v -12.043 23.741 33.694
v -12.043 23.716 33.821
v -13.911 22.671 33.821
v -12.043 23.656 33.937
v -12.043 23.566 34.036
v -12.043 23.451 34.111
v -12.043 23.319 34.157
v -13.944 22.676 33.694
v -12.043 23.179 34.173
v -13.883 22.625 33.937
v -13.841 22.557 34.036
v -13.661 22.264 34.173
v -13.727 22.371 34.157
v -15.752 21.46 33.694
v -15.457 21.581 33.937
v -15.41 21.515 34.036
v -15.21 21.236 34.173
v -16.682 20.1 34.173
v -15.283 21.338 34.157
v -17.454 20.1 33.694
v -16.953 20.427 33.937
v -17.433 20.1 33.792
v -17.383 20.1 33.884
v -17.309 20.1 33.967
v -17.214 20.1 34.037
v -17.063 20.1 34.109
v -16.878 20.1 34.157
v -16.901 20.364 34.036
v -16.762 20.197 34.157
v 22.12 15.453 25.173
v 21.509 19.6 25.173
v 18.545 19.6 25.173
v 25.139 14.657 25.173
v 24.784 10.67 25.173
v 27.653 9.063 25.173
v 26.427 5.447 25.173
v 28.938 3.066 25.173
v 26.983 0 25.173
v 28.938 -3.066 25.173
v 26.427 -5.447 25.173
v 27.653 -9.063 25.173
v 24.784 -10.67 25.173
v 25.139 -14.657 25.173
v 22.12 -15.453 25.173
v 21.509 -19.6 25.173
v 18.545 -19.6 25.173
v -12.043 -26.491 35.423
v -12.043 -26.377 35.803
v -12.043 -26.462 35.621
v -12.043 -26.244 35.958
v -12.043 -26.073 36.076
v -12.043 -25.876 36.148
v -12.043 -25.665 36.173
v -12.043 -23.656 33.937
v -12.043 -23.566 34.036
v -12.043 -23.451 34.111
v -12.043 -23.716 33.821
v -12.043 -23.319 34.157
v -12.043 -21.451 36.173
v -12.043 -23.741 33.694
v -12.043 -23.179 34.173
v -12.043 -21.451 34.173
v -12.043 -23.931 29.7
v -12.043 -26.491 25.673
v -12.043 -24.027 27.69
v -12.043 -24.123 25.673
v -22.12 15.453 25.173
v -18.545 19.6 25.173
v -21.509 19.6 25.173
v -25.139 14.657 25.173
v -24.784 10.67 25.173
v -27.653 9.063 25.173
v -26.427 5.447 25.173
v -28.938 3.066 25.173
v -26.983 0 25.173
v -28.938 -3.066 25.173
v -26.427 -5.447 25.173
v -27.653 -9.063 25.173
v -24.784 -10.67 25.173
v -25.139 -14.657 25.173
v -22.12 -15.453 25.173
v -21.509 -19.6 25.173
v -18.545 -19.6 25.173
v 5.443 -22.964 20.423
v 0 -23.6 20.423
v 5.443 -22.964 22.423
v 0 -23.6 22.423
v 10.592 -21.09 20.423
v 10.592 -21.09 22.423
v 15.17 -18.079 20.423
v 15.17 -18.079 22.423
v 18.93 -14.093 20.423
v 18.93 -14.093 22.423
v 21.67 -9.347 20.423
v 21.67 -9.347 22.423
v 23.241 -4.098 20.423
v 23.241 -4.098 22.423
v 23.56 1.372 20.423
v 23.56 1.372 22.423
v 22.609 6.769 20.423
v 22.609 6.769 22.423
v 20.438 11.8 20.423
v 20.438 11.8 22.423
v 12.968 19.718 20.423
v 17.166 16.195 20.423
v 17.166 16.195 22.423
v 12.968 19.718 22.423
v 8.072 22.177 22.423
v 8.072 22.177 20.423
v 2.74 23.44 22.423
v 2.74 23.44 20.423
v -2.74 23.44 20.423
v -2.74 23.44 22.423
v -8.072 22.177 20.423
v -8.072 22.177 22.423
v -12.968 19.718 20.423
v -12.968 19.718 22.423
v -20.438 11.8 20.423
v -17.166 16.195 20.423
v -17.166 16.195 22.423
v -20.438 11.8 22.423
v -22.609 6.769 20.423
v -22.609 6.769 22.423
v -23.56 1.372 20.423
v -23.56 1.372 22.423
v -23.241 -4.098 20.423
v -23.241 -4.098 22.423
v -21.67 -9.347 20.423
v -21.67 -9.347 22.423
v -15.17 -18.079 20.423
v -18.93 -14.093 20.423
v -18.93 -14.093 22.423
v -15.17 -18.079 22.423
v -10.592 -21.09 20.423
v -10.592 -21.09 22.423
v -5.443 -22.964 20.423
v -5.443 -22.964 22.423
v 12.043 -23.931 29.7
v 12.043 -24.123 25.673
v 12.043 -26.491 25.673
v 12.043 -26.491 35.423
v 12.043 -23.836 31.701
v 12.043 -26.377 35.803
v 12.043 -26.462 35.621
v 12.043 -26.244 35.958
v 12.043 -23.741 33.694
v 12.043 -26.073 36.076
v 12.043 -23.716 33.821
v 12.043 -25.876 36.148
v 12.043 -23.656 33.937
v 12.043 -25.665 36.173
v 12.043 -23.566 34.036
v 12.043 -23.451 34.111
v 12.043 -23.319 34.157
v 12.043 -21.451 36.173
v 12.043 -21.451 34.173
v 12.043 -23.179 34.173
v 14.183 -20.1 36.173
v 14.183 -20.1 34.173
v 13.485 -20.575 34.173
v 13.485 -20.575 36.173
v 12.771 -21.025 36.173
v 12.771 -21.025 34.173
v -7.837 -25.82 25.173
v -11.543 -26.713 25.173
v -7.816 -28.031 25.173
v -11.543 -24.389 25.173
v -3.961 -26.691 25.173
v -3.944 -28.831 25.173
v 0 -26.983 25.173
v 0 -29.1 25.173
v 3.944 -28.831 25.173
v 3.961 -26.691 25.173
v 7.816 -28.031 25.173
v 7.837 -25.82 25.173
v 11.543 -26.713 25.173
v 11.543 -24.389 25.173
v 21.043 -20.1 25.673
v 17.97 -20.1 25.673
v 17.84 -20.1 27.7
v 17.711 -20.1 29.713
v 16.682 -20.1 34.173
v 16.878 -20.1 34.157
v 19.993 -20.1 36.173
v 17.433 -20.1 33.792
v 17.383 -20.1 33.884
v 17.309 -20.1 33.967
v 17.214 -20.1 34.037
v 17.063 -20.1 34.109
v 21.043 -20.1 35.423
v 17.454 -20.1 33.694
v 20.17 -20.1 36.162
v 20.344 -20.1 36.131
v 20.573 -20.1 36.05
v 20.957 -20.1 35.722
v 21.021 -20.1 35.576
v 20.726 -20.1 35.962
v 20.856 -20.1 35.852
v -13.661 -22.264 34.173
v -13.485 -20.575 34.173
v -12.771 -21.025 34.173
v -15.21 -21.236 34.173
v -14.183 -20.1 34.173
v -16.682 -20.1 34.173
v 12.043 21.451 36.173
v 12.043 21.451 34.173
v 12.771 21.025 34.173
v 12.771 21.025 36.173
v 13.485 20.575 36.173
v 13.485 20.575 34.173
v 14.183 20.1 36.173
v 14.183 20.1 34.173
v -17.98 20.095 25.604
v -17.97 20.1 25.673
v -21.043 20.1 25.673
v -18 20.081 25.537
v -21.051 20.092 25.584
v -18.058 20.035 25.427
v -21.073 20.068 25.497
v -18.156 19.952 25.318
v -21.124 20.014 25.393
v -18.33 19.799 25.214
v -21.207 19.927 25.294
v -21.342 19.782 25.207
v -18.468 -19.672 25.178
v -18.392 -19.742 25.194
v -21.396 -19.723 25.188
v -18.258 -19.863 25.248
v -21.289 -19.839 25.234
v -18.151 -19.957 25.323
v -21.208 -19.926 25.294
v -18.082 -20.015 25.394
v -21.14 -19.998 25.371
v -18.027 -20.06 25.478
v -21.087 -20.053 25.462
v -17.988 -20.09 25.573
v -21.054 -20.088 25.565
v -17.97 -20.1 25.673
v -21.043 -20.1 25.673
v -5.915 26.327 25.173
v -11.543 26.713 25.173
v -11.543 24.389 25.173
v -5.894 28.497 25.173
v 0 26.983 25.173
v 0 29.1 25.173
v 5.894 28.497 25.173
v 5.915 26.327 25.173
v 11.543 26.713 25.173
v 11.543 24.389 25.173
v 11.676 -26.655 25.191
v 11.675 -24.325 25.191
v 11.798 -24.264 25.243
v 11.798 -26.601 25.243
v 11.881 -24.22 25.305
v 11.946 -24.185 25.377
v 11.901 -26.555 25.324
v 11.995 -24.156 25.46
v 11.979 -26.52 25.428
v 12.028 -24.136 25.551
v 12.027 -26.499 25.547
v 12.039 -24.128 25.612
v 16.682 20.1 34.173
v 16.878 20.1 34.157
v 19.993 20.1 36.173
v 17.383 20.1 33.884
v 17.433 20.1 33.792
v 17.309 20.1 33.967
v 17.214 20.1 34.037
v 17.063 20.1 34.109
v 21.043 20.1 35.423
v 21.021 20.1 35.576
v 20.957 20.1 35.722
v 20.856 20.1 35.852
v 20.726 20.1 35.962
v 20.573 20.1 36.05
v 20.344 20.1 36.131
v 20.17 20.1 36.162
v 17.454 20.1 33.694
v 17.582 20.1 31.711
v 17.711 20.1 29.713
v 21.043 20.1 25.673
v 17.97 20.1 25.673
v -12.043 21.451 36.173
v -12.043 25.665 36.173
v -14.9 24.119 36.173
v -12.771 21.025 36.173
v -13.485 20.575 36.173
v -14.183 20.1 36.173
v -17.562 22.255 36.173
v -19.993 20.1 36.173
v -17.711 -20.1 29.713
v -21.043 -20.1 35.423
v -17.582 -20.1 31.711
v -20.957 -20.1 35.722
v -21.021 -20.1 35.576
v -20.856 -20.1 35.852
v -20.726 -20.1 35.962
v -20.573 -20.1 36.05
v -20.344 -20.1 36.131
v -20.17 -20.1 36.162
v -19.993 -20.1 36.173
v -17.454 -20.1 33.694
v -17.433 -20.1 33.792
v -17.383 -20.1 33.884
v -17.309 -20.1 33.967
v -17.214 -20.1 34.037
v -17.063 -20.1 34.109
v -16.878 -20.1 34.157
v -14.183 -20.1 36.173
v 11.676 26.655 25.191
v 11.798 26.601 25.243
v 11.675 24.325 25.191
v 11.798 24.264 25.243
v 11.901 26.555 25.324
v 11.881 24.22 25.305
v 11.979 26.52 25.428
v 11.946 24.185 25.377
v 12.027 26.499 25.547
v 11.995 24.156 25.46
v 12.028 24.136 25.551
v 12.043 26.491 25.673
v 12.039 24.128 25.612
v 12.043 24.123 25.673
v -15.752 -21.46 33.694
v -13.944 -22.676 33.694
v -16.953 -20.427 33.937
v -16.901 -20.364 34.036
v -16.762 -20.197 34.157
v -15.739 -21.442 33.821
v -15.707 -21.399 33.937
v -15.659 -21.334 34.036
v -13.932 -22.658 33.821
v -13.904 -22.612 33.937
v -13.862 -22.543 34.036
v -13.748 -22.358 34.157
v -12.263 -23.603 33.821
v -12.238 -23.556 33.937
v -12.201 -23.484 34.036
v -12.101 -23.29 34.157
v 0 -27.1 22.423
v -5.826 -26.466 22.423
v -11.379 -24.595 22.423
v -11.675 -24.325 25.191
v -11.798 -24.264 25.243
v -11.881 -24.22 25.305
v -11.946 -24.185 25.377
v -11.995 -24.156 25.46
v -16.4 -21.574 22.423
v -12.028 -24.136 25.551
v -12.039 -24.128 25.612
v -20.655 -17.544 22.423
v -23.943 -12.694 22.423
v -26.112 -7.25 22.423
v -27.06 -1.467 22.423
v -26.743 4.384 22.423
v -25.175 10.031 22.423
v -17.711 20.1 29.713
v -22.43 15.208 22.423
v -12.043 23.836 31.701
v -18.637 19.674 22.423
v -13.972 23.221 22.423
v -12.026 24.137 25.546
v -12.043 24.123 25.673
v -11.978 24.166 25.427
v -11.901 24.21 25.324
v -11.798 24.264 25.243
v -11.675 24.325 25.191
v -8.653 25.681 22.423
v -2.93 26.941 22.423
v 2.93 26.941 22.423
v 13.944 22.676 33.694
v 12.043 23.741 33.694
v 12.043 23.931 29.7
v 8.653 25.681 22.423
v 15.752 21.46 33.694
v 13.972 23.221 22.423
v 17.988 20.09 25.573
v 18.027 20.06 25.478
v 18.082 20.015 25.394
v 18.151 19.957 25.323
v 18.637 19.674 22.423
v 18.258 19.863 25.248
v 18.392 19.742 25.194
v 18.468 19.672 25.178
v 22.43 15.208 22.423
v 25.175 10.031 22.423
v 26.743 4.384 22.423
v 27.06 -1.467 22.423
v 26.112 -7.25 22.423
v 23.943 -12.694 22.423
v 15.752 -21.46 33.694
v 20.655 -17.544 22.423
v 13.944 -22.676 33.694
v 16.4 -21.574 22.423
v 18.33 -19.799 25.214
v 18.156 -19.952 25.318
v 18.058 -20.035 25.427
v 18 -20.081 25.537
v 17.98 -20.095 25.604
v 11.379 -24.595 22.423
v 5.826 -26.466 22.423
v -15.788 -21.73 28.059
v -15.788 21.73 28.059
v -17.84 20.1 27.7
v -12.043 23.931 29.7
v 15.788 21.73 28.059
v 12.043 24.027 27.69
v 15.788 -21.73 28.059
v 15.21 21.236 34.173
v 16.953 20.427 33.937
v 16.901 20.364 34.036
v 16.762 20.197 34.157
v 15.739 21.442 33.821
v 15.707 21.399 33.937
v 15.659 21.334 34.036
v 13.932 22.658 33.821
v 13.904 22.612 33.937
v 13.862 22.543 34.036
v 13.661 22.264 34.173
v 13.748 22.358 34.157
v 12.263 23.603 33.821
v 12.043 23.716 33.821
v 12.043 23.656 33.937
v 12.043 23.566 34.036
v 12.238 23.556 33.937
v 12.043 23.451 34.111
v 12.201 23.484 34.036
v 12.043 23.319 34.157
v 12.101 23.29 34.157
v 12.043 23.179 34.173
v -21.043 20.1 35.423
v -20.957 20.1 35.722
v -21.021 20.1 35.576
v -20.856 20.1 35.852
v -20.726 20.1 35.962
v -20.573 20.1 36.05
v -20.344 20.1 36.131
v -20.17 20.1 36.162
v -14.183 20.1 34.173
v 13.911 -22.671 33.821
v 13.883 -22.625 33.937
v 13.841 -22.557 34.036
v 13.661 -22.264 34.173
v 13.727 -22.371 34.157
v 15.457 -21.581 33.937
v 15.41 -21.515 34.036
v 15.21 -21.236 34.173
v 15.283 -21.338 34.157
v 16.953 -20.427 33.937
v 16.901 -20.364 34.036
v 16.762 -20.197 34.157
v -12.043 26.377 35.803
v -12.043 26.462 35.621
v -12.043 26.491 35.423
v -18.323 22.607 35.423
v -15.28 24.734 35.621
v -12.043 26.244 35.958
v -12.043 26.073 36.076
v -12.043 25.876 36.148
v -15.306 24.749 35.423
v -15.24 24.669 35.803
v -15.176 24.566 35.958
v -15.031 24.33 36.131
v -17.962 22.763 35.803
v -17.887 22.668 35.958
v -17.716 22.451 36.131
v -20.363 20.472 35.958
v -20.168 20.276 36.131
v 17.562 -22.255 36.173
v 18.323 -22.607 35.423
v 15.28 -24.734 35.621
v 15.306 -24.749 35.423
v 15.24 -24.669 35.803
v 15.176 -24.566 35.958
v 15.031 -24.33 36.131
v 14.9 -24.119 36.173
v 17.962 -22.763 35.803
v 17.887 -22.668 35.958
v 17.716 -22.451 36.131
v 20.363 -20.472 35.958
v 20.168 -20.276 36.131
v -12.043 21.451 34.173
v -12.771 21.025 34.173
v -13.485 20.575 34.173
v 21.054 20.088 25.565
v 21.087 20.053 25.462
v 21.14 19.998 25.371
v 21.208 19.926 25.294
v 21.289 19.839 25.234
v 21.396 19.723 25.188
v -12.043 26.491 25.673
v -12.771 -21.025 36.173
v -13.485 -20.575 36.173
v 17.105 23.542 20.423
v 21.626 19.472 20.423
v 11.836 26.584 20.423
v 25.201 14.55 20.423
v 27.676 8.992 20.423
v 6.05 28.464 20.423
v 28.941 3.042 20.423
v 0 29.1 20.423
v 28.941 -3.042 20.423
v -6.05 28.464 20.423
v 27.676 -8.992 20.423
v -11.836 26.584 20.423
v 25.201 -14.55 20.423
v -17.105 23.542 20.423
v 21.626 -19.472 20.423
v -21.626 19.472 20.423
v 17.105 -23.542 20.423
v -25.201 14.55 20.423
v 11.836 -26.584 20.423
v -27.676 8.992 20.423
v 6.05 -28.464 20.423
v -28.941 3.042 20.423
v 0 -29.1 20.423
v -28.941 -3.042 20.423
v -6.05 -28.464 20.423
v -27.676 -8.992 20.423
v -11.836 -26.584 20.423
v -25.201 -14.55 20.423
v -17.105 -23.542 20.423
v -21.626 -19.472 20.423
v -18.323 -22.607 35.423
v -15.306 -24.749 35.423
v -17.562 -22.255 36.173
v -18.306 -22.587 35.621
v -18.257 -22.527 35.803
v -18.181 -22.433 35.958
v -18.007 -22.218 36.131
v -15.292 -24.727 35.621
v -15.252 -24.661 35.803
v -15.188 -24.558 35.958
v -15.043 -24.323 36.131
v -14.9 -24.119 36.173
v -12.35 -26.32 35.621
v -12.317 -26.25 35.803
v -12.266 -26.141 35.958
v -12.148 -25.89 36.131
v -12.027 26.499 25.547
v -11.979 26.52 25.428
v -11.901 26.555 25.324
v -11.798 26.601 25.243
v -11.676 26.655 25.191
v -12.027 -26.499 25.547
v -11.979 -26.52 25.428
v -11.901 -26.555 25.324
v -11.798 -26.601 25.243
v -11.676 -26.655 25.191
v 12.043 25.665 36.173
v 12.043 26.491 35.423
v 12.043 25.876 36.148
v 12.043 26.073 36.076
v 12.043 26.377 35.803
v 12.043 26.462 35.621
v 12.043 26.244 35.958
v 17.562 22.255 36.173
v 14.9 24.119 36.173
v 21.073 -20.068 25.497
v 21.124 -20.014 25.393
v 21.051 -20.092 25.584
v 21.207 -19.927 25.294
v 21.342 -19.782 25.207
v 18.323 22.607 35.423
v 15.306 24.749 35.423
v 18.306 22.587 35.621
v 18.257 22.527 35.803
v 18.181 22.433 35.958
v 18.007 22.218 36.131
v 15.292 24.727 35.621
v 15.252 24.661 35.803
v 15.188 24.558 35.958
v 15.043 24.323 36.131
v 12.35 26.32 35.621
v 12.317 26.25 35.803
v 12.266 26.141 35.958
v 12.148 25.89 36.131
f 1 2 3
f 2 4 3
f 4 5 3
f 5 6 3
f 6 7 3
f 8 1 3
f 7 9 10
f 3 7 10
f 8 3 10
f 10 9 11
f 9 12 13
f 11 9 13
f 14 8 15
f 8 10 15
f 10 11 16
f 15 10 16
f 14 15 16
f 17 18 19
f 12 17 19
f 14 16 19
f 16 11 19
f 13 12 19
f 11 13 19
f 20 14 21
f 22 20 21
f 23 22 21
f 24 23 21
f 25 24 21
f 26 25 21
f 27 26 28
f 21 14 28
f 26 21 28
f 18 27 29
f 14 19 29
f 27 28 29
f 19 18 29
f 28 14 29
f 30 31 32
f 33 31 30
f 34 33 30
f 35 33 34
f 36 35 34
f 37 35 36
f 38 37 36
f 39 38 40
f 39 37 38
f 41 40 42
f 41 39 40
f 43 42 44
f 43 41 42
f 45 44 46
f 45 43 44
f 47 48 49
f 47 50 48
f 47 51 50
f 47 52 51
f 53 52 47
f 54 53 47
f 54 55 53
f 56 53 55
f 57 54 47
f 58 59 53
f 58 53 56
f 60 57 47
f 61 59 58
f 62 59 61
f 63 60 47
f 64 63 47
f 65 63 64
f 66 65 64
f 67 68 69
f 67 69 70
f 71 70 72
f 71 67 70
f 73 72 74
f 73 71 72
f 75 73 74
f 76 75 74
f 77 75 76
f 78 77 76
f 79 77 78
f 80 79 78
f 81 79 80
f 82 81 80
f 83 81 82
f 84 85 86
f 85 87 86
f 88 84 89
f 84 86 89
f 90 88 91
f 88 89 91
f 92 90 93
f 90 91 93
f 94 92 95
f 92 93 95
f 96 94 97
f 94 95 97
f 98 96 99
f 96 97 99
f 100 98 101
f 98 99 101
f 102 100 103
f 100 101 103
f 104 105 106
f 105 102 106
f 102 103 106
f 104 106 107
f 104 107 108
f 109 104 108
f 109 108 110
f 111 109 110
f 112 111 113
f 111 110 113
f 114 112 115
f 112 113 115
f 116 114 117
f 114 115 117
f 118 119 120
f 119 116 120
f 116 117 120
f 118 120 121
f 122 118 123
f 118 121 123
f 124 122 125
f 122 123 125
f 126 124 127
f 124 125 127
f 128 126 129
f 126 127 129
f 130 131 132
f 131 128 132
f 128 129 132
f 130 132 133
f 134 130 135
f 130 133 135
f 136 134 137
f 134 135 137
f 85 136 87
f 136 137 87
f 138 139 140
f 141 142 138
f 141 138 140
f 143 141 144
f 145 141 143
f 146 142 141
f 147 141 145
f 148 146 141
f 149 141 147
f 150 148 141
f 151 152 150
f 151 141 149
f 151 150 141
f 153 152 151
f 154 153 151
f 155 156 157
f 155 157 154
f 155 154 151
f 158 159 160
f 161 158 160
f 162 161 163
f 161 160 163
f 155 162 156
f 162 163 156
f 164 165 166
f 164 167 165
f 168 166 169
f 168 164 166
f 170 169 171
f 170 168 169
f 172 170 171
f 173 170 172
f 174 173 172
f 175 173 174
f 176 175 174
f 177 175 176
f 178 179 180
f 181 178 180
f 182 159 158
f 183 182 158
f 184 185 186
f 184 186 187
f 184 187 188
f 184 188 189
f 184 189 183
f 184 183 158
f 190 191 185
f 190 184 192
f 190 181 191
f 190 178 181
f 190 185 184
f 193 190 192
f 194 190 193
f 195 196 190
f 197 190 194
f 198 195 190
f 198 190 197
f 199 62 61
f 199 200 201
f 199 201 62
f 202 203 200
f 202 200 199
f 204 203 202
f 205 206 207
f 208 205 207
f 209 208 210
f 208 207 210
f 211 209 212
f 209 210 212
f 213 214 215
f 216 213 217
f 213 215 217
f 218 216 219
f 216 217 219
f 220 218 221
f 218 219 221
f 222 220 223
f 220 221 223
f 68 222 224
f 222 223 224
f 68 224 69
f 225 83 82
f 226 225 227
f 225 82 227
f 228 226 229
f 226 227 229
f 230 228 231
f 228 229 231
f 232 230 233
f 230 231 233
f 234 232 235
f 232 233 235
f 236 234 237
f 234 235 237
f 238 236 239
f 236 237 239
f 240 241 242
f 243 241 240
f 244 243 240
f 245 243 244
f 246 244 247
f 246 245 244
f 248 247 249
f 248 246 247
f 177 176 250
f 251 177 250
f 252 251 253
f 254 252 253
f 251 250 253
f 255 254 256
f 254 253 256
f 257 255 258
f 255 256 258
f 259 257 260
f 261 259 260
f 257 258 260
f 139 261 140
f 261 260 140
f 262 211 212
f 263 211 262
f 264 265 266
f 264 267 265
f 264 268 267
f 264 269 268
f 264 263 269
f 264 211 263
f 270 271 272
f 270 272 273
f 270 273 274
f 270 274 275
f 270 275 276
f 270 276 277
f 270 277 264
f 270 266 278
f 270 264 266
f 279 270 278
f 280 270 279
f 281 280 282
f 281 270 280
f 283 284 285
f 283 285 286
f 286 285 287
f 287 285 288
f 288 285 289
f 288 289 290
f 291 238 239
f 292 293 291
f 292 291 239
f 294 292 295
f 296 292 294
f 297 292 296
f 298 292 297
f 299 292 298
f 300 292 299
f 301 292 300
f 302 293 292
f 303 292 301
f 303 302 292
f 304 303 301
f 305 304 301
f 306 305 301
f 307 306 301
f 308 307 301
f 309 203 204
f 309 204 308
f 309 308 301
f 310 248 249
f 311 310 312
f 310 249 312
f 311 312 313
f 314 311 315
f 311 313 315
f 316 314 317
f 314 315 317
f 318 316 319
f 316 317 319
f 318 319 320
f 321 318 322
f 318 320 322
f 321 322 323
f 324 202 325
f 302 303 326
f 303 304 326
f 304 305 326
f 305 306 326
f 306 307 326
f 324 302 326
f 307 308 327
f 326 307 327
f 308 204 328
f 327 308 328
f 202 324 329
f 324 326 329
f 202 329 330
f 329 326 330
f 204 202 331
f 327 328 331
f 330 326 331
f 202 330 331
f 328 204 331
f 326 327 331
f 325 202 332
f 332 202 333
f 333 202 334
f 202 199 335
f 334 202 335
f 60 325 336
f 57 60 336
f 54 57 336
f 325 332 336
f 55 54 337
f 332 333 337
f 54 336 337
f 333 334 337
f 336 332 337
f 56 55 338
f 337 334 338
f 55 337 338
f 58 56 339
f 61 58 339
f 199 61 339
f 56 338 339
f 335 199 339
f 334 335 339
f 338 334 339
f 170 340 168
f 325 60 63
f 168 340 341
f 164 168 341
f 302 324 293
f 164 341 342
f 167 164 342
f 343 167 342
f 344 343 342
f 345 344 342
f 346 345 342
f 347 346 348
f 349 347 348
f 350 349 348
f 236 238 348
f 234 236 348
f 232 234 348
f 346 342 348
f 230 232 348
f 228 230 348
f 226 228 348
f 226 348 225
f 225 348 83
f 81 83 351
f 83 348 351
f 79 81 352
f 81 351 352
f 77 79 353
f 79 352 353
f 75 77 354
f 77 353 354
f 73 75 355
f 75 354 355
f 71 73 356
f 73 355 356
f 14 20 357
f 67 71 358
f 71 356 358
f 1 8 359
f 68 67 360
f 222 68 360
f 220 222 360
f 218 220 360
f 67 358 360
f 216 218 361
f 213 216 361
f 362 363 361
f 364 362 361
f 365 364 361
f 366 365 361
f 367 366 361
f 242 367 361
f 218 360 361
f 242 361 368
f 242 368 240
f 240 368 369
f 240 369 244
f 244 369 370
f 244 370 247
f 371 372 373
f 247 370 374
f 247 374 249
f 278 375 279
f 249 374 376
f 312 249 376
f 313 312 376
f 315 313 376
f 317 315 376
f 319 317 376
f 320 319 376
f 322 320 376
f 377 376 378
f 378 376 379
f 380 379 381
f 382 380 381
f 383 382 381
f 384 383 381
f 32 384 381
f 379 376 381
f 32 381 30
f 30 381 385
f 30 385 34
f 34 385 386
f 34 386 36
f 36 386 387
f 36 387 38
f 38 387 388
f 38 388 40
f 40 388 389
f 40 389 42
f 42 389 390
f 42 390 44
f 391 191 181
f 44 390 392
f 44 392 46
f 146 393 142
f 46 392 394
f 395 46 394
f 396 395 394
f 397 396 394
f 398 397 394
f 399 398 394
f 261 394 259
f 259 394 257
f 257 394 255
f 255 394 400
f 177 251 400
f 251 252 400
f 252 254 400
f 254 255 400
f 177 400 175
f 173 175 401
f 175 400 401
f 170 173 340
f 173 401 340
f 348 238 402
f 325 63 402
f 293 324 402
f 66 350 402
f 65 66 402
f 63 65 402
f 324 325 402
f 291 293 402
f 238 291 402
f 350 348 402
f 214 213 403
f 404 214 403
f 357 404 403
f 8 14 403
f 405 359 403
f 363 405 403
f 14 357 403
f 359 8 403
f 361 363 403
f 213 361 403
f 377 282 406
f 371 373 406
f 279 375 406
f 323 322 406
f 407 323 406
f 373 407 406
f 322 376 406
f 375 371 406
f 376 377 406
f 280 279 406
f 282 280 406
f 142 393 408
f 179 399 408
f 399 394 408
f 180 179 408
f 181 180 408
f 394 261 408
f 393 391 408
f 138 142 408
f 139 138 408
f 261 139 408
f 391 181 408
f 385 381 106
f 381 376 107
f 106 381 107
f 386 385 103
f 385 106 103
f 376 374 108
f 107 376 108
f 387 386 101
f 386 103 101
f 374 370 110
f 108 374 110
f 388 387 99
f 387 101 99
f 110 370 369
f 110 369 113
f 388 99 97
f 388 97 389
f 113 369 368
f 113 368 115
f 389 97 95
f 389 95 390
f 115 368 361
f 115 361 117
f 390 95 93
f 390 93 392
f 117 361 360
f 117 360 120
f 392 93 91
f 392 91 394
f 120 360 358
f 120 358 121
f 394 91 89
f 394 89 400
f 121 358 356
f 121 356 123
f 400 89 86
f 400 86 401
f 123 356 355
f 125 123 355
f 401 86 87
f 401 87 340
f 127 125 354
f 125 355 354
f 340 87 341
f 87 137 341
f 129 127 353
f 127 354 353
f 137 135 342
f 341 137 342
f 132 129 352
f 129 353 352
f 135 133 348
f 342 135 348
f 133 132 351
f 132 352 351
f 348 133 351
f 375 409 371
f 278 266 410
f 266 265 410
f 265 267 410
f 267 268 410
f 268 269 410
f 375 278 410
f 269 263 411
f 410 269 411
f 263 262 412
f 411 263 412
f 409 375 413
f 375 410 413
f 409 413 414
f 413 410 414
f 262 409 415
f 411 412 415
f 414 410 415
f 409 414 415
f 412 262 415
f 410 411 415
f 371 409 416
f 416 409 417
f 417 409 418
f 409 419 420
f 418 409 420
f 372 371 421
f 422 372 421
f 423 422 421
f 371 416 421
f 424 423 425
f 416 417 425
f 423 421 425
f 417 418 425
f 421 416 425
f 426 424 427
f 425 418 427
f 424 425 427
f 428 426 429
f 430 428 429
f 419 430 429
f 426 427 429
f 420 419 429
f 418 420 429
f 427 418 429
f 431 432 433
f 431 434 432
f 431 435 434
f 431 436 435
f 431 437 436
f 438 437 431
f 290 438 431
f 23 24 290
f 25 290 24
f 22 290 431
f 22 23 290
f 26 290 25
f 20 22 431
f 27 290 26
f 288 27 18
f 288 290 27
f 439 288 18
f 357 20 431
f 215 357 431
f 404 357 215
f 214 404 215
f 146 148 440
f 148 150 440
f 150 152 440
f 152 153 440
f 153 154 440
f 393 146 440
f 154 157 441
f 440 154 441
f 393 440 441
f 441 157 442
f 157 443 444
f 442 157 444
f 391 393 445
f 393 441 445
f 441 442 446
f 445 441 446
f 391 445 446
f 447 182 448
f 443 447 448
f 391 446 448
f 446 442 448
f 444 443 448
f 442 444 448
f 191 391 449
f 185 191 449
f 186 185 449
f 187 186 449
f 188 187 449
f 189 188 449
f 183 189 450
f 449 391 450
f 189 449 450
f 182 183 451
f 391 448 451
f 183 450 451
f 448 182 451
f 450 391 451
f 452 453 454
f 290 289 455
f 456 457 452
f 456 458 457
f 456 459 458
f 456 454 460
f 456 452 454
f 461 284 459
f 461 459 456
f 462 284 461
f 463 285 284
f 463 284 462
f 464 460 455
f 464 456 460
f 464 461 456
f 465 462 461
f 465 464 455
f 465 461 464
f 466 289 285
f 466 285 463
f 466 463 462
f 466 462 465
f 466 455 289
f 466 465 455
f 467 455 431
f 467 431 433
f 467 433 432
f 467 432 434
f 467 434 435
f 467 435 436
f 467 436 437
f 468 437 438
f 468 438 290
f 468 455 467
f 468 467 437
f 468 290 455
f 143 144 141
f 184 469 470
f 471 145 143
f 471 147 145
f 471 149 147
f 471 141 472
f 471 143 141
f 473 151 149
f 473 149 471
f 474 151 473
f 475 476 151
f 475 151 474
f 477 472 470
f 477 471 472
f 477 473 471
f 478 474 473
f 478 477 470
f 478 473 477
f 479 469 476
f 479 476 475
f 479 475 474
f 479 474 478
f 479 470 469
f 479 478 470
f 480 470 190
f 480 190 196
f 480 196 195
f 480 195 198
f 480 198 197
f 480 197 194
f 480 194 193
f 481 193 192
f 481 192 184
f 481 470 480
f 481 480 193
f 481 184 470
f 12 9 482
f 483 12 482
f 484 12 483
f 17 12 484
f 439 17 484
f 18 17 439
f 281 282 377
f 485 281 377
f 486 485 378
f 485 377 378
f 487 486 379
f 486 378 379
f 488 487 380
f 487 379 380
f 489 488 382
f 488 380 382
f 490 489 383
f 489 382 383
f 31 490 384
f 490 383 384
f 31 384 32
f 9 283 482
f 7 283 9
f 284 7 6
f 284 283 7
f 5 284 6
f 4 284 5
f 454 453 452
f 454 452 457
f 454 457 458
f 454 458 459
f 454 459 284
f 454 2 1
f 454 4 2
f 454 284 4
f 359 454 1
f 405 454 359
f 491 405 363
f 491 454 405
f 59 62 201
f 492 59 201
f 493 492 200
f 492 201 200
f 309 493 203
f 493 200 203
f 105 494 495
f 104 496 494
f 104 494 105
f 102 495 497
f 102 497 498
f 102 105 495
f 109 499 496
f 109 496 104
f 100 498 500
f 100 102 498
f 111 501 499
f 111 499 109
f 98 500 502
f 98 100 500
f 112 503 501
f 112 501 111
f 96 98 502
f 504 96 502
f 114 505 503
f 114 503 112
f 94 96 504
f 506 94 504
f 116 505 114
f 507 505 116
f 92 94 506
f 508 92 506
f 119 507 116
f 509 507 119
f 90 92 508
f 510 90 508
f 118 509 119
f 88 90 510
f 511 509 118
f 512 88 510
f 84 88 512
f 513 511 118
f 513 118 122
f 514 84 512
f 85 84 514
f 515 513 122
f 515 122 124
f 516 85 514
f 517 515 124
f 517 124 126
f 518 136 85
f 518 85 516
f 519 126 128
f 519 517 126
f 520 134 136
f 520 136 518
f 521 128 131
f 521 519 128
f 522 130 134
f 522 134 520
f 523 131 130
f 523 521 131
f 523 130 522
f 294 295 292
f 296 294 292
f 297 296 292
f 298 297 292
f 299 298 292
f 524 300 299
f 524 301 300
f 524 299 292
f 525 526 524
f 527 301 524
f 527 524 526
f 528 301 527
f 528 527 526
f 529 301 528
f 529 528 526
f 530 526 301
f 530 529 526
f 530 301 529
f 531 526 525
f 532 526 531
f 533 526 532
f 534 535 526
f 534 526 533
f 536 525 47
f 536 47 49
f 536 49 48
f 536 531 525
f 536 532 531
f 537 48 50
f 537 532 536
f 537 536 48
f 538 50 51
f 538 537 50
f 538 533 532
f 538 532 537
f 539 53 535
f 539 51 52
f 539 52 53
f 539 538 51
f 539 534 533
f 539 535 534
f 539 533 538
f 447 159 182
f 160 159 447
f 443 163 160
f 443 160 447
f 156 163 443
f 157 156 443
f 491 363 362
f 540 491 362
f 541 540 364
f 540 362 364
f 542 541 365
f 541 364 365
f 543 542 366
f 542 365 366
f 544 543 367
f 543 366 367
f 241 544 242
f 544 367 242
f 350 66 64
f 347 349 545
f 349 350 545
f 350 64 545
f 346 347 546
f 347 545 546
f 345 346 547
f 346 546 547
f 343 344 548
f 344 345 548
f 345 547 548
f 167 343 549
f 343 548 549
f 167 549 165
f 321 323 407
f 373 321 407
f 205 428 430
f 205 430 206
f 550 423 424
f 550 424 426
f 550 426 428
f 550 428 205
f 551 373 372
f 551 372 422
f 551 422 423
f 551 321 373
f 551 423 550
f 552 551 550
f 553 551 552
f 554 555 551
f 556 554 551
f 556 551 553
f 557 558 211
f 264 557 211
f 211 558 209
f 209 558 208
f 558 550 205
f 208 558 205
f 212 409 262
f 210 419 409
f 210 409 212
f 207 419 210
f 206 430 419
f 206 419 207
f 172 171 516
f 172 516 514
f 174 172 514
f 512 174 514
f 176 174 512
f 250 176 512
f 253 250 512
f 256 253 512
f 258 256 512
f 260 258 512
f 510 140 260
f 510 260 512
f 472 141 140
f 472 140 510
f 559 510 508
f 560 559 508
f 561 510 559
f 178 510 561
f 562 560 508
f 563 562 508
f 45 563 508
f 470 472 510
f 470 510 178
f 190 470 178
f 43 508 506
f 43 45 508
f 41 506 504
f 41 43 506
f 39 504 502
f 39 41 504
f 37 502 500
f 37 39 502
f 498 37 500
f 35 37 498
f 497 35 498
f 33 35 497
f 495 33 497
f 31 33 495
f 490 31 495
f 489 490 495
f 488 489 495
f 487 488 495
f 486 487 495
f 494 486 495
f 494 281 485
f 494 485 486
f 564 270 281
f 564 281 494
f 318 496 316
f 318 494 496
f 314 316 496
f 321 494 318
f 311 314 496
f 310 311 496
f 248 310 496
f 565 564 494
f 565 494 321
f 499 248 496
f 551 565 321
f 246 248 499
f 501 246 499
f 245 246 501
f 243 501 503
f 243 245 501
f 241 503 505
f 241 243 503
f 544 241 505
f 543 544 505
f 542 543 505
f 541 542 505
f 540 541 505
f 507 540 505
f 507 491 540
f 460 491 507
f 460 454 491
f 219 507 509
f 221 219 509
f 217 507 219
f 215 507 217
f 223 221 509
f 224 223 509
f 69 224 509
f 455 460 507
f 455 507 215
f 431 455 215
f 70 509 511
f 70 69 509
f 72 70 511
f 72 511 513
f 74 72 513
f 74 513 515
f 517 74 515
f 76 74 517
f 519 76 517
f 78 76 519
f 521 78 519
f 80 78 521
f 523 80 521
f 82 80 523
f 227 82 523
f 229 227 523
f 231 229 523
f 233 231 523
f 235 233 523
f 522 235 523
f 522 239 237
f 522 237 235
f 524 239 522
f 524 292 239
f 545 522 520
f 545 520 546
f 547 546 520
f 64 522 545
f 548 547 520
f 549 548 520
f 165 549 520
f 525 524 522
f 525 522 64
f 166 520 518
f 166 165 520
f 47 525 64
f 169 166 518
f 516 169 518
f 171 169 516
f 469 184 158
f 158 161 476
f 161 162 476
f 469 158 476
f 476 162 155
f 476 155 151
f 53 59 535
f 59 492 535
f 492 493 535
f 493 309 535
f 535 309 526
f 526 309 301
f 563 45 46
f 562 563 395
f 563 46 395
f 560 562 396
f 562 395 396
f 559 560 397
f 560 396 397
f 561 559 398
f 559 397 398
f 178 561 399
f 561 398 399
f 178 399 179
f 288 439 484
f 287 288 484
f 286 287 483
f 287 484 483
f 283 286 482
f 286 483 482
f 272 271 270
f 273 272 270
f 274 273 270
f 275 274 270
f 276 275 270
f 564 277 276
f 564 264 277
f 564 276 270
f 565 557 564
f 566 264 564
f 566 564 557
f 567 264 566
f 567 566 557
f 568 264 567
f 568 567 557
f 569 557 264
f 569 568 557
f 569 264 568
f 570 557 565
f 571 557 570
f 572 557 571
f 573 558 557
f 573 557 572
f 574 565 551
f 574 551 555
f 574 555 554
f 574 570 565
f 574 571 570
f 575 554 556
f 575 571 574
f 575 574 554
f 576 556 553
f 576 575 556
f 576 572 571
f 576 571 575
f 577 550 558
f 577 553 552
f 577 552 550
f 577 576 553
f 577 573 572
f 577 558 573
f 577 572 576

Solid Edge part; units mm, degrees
sketch "Sketch1" plane through (0, 0, 0) normal (-1, 0, 0) x (0, -1, 0)
  line L0 (23.6, 20.423) -> (29.1, 20.423)
  line L1 (29.1, 20.423) -> (29.1, 22.423)
  line L2 (29.1, 22.423) -> (29.1, 36.173)
  line L3 (29.1, 36.173) -> (24.6, 36.173)
  line L4 (24.6, 36.173) -> (24.6, 34.173)
  line L5 (24.6, 34.173) -> (26.6, 34.173)
  line L6 (26.6, 34.173) -> (27.1, 22.423)
  line L7 (23.6, 22.423) -> (27.1, 22.423)
  line L8 (23.6, 20.423) -> (23.6, 22.423)
  dimension "D1" = 13.75
  dimension "D2" = 2
  dimension "D3" = 5.5
  dimension "D4" = 2
  dimension "D5" = 2
  dimension "D6" = 4.5
  dimension "D7" = 2
  dimension "D8" = 3.5
  dimension "D9" = 23.6
  dimension "D10" = 11.75
revolve "RevolvedProtrusion1" add sketch "Sketch1" angle 360 about axis through (0, 0, 57) along (0, 0, -1)
sketch "Sketch2" plane through (0, 0, 0) normal (-1, 0, 0) x (0, -1, 0)
  line L0 (-20.1, 36.173) -> (-20.1, 25.173)
  line L1 (-20.1, 25.173) -> (20.1, 25.173)
  line L2 (20.1, 25.173) -> (20.1, 36.173)
  line L3 (20.1, 36.173) -> (-20.1, 36.173)
  dimension "D1" = 9
  dimension "D2" = 9
  dimension "D3" = 11
extrude "Cutout1" cut sketch "Sketch2" along normal mid plane 75
sketch "Sketch3" plane through (0, 0, 0) normal (0, -1, 0) x (1, 0, 0)
  line L0 (-12.0428, 36.173) -> (-12.0428, 25.173)
  line L1 (-12.0428, 25.173) -> (12.0428, 25.173)
  line L2 (12.0428, 25.173) -> (12.0428, 36.173)
  line L3 (12.0428, 36.173) -> (-12.0428, 36.173)
  dimension "D1" = 11
  dimension "D2" = 9
  dimension "D3" = 9
extrude "Extrusionsausschnitt_2" cut sketch "Sketch3" along normal mid plane 75
fillet "Verrundung_0_5_mm" radius 0.5 12 edges at (19.5224, -20.1, 25.173) (-12.0428, -25.3188, 25.173) (12.0428, -25.3188, 25.173) (-19.5224, -20.1, 25.173) (-19.5224, 20.1, 25.173) (-12.0428, 25.3188, 25.173) (12.0428, 25.3188, 25.173) (19.5224, 20.1, 25.173) (14.8434, 22.0734, 34.173) (-14.8434, 22.0734, 34.173) (-14.8434, -22.0734, 34.173) (14.8434, -22.0734, 34.173)
fillet "Verrundung_0_75_mm" radius 0.75 4 edges at (-16.8486, -23.7262, 36.173) (16.8486, -23.7262, 36.173) (16.8486, 23.7262, 36.173) (-16.8486, 23.7262, 36.173)
